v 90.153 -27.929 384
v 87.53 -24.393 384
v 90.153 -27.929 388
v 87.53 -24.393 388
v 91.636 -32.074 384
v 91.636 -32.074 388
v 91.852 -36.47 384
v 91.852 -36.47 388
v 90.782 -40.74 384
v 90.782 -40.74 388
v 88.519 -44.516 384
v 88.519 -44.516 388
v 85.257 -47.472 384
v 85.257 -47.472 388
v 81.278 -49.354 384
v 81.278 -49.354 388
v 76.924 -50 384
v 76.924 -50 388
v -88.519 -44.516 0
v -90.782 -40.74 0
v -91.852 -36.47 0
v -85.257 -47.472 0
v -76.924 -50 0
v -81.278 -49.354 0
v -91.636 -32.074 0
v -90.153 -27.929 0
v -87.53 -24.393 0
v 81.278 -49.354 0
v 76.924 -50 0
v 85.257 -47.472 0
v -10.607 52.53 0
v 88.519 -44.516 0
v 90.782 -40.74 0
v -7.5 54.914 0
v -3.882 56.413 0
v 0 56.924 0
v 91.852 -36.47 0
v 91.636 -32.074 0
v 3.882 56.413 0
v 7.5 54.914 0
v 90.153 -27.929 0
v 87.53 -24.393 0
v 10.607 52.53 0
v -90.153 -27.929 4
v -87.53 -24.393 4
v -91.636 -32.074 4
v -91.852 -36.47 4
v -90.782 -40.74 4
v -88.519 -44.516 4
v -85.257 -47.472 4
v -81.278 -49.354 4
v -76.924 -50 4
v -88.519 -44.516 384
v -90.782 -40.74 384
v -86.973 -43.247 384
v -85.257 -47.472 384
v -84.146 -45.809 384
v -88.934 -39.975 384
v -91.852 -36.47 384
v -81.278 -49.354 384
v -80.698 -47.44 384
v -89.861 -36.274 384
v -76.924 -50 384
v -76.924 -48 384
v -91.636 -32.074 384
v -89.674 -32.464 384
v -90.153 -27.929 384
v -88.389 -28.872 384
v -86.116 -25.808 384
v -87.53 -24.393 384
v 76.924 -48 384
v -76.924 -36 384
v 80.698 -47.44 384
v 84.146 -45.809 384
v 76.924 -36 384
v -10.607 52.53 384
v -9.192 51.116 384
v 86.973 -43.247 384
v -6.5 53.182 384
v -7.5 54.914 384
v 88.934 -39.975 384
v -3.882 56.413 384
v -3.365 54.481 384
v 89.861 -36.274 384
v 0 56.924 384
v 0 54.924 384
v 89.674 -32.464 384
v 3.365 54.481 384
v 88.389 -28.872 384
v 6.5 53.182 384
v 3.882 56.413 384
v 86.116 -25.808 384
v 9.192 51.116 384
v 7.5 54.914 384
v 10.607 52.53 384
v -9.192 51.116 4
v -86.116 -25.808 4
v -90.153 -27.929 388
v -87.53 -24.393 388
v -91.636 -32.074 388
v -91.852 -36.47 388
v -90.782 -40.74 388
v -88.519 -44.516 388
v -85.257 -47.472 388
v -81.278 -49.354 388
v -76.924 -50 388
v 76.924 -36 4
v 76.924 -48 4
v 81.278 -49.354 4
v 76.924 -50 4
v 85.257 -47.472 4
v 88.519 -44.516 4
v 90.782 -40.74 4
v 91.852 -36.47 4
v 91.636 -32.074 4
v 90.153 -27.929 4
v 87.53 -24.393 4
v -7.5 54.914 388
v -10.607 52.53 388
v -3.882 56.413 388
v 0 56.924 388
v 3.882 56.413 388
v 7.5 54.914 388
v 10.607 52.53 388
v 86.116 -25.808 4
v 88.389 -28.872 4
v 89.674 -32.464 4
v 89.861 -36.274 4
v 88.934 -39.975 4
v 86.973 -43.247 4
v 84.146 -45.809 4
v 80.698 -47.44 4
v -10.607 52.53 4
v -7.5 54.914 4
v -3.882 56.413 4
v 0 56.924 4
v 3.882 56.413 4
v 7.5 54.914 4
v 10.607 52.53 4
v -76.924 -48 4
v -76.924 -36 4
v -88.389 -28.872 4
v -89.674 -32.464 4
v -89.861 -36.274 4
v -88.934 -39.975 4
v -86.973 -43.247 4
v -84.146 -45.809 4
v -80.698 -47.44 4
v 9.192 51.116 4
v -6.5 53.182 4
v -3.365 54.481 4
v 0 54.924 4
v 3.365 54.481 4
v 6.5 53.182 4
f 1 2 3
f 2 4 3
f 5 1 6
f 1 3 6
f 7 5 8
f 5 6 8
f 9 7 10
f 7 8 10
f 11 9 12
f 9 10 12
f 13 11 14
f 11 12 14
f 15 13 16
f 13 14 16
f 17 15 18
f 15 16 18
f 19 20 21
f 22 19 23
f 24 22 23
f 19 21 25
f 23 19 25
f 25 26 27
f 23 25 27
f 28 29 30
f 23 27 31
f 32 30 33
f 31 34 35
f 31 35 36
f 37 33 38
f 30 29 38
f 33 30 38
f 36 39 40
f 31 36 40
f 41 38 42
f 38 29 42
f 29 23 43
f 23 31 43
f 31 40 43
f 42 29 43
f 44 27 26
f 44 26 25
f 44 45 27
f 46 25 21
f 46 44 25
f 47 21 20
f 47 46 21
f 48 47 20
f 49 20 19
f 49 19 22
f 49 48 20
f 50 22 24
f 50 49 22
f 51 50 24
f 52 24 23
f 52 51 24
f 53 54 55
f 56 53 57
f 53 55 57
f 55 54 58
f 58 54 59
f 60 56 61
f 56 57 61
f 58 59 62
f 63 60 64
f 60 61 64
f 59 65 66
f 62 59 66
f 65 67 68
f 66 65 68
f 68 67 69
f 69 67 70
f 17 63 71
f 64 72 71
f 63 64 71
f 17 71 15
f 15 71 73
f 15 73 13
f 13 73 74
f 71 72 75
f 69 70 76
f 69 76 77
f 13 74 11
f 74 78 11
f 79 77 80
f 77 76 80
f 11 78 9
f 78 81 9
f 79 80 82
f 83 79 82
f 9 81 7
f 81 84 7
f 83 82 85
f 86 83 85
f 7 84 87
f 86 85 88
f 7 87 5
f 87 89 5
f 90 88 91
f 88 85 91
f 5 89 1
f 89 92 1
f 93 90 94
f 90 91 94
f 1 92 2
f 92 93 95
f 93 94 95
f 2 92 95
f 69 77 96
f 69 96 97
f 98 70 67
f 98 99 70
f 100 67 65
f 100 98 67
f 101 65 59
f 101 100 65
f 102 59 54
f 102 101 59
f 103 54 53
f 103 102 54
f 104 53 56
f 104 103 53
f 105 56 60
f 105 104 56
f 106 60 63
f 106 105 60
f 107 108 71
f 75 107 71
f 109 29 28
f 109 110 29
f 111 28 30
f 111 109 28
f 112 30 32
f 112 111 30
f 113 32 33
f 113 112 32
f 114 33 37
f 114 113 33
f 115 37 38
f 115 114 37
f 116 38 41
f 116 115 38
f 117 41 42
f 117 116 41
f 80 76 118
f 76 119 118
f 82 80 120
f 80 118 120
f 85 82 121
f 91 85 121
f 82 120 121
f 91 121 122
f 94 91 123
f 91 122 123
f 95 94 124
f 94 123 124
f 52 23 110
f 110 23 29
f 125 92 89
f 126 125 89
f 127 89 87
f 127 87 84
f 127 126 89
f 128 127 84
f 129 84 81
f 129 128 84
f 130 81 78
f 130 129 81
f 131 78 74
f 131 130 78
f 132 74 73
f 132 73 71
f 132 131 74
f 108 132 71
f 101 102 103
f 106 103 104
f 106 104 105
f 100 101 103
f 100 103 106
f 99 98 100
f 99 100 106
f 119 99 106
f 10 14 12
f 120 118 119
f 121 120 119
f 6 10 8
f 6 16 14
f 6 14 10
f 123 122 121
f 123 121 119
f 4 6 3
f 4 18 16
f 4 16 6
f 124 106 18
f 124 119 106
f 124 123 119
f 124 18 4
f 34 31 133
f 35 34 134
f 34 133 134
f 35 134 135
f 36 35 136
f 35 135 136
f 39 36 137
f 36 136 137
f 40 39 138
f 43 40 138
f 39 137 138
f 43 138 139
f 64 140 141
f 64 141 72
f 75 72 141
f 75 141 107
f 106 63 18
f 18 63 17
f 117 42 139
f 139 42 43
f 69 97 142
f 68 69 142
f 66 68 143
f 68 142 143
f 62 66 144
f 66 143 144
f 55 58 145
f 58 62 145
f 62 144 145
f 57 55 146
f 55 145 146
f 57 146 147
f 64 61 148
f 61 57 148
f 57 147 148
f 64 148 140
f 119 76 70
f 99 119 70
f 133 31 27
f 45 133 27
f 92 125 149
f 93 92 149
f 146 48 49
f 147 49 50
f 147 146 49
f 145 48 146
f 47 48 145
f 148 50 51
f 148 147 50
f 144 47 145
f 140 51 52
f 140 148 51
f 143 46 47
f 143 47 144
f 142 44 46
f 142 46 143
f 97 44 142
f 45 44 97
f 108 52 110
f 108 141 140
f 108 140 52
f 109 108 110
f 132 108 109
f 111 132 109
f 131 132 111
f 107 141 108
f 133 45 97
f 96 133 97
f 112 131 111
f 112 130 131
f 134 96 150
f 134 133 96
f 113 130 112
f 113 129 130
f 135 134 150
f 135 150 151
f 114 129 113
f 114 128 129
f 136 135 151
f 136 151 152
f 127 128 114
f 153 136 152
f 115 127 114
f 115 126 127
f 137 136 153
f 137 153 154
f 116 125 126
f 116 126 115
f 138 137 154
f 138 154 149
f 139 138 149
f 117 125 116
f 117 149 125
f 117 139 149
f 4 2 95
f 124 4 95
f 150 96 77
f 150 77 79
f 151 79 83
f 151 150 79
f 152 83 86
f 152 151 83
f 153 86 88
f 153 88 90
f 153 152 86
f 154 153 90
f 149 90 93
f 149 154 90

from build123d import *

# Parameters (mm, degrees)
F1_DEPTH    = 4
F2_R        = 15
F4_DEPTH    = 380
F5_T1_DEPTH = 458.4619407771
F5_T3_DEPTH = 412.5
F7_DEPTH    = 4
F8_R        = 15
F9_W        = 153.8477631085
F9_H        = 380
F10_DEPTH   = 12


# Not quite as in the source:
# - a fillet or chamfer that OpenCascade refuses, or shapes differently, is made with other operations: its cross-section is extruded or revolved along the edge and cut away or added


with BuildPart() as f1:
    # F0 (on Top) → F1 (new body)
    with BuildSketch(Plane.XY):
        Polygon((0, 63.1370849898), (-113.1370849898, -50), (113.1370849898, -50), align=None)
    extrude(amount=F1_DEPTH)

    # F2
    f2_edges = [f1.edges().sort_by_distance(p)[0] for p in [
        (-113.137085, -50, 2),
        (113.137085, -50, 2),
        (0, 63.137085, 2),
    ]]
    fillet(f2_edges, radius=F2_R)

    # F3 (on face) → F4 (join)
    with BuildSketch(Plane.XY.offset(4)):
        Polygon((108.3086578651, -48), (0, 60.3086578651), (-108.3086578651, -48), align=None)
    extrude(amount=F4_DEPTH)

    # F5: fillet of radius 13 on 3 edges, made by hand

    # F5_s2 → F5_t1 (cut)
    with BuildSketch(Plane.XY.offset(4)):
        with BuildLine():
            ThreePointArc((86.1162697097, -25.8076118446), (88.9343154769, -39.9748846207), (76.9238815543, -48))
            Line((76.9238815543, -48), (108.3086578651, -48))
            Line((108.3086578651, -48), (86.1162697097, -25.8076118446))
        make_face()
        with BuildLine():
            ThreePointArc((-86.1162697097, -25.8076118446), (-88.9343154769, -39.9748846207), (-76.9238815543, -48))
            Line((-76.9238815543, -48), (-108.3086578651, -48))
            Line((-108.3086578651, -48), (-86.1162697097, -25.8076118446))
        make_face()
    extrude(amount=F5_T1_DEPTH, mode=Mode.SUBTRACT)

    # F5_s4 → F5_t3 (cut)
    with BuildSketch(Plane.XY.offset(4)):
        with BuildLine():
            ThreePointArc((-9.1923881554, 51.1162697097), (0, 54.9238815543), (9.1923881554, 51.1162697097))
            Line((9.1923881554, 51.1162697097), (0, 60.3086578651))
            Line((0, 60.3086578651), (-9.1923881554, 51.1162697097))
        make_face()
    extrude(amount=F5_T3_DEPTH, mode=Mode.SUBTRACT)

    # F6 (on face) → F7 (join)
    with BuildSketch(Plane.XY.offset(384)):
        Polygon((0, 63.1370849898), (-113.1370849898, -50), (113.1370849898, -50), align=None)
    extrude(amount=F7_DEPTH)

    # F8
    f8_edges = [f1.edges().sort_by_distance(p)[0] for p in [
        (113.137085, -50, 386),
        (-113.137085, -50, 386),
        (0, 63.137085, 386),
    ]]
    fillet(f8_edges, radius=F8_R)

    # F9 (on face) → F10 (cut)
    with BuildSketch(Plane.XZ.offset(48)):
        with Locations((0, 194)):
            Rectangle(F9_W, F9_H)
    extrude(amount=-F10_DEPTH, mode=Mode.SUBTRACT)


solid = f1.part
